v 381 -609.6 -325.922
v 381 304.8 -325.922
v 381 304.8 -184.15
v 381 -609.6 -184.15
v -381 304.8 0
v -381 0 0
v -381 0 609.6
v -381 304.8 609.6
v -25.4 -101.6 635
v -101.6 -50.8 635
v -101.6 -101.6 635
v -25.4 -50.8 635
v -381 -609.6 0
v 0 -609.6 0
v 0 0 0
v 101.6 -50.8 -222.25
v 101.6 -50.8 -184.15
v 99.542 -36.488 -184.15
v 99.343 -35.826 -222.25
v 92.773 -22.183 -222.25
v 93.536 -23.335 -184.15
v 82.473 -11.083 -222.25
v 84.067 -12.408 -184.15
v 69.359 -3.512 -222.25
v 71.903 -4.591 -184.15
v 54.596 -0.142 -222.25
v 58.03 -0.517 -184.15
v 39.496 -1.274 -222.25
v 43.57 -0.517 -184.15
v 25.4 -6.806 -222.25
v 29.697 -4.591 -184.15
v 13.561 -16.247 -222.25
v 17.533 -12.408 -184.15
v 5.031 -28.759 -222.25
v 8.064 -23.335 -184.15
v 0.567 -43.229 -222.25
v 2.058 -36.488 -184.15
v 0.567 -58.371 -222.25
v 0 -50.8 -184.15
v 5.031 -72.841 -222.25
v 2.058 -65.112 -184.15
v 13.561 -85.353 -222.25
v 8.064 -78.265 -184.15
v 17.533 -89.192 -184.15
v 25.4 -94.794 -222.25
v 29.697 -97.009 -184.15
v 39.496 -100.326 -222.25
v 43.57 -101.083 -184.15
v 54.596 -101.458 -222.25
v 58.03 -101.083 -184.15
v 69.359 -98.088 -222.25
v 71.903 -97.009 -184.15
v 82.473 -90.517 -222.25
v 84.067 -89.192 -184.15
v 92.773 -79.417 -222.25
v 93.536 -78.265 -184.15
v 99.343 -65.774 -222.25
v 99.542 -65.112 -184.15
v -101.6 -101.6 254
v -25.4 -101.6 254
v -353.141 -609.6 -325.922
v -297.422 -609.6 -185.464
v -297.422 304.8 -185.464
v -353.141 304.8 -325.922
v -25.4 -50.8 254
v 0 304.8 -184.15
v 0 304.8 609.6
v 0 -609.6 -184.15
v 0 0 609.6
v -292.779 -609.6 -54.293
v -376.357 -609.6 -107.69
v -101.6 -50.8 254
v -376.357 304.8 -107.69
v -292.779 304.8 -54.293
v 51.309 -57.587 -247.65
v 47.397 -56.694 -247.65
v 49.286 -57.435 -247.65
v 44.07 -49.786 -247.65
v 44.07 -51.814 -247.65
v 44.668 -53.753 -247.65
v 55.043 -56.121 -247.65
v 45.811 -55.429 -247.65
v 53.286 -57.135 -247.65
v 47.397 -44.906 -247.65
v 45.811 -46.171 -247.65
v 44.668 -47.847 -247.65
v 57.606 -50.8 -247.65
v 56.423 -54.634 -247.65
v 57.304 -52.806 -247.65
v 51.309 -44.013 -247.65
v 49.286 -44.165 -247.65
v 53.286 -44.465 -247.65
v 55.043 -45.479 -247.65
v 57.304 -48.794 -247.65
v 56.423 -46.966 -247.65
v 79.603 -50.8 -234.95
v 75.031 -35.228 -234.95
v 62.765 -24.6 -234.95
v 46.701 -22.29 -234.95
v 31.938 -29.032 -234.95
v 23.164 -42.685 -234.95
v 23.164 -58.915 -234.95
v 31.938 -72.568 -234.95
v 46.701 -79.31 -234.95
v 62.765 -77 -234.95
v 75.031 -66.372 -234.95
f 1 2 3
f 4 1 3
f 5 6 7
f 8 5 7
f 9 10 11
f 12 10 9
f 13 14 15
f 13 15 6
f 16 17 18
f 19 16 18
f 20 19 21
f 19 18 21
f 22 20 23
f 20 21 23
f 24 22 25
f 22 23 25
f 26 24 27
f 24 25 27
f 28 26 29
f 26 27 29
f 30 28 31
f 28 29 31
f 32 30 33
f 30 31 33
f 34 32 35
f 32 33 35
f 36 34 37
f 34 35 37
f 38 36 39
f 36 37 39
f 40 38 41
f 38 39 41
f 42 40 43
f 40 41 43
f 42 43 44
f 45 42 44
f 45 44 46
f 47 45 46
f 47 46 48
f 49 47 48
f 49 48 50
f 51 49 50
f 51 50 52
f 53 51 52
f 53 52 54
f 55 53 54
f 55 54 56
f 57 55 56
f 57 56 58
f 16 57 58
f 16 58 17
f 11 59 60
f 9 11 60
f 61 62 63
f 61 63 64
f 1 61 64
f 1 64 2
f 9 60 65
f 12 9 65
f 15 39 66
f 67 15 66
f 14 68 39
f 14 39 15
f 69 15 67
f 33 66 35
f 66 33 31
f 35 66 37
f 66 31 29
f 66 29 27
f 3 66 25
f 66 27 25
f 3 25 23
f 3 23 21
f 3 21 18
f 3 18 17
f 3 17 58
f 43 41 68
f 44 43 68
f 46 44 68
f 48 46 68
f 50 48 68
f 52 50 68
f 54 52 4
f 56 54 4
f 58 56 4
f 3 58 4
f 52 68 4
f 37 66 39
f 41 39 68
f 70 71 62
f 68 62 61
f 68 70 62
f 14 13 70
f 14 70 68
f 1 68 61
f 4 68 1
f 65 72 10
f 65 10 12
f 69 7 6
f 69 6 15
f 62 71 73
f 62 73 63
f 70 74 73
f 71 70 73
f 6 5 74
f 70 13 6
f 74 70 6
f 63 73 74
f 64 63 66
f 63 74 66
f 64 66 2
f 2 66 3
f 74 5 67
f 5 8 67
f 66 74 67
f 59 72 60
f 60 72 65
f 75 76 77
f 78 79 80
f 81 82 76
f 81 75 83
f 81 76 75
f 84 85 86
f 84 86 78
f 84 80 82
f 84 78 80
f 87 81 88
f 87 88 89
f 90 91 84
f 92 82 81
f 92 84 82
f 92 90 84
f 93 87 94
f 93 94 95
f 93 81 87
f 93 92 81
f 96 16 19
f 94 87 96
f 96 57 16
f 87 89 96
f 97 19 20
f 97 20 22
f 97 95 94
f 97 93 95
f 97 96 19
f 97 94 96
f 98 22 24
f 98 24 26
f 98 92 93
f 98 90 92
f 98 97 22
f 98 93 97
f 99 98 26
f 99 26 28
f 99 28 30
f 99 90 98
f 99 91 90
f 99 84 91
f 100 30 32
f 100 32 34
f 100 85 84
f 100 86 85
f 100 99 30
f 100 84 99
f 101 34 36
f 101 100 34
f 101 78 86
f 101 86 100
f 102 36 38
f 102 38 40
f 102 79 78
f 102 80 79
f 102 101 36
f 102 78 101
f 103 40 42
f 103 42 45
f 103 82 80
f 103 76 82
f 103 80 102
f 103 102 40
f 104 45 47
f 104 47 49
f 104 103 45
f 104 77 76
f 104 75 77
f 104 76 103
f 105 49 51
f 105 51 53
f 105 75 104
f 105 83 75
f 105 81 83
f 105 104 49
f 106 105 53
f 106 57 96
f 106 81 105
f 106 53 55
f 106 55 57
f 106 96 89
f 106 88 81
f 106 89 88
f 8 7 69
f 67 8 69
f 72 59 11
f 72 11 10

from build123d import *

# Parameters (mm, degrees)
F0_W     = 381
F0_H     = 141.7715725336
F1_DEPTH = 609.6
F0_H_2   = 609.6
F2_DEPTH = 304.8
F4_W     = 76.2
F4_H     = 50.8
F5_DEPTH = 381
F7_DEPTH = 38.1
F8_R     = 50.8
F9_DEPTH = 25.4
F9_TAPER = 60


with BuildPart() as f1:
    # F0 (on Front) → F1 (new body)
    with BuildSketch(Plane.XZ):
        Polygon((0, -184.15), (0, 0), (-381, 0), (-292.7788101229, -54.2931120234), (-376.3567831644, -107.6901625084), (-297.4220269585, -185.4641232554), (-353.1406989864, -325.9215725336), (0, -325.9215725336), align=None)
        with Locations((190.5, -255.0357862668)):
            Rectangle(F0_W, F0_H)
    extrude(amount=F1_DEPTH)

    # F0 (on Front) → F2 (join)
    with BuildSketch(Plane.XZ):
        Polygon((0, -184.15), (0, 0), (-381, 0), (-292.7788101229, -54.2931120234), (-376.3567831644, -107.6901625084), (-297.4220269585, -185.4641232554), (-353.1406989864, -325.9215725336), (0, -325.9215725336), align=None)
        with Locations((190.5, -255.0357862668)):
            Rectangle(F0_W, F0_H)
        with Locations((-190.5, 304.8)):
            Rectangle(F0_W, F0_H_2)
    extrude(amount=-F2_DEPTH)

    # F6 (on face) → F7 (cut)
    with BuildSketch(Plane.XY.offset(-184.15)):
        with BuildLine():
            ThreePointArc((0, -50.7999995777), (50.7999997889, -101.6), (101.6, -50.8))
            ThreePointArc((101.6, -50.8), (50.8000002111, 0), (0, -50.7999995777))
        make_face()
    extrude(amount=-F7_DEPTH, mode=Mode.SUBTRACT)

    # F8 (on face) → F9 (cut)
    with BuildSketch(Plane.XY.offset(-222.25)):
        with Locations((50.8, -50.8)):
            Circle(F8_R)
    extrude(amount=-F9_DEPTH, taper=F9_TAPER, mode=Mode.SUBTRACT)


with BuildPart() as f5:
    # F4 (on offset) → F5 (new body)
    with BuildSketch(Plane.XY.offset(254)):
        with Locations((-63.5, -76.2)):
            Rectangle(F4_W, F4_H)
    extrude(amount=F5_DEPTH)


solid = Compound([f1.part, f5.part])
